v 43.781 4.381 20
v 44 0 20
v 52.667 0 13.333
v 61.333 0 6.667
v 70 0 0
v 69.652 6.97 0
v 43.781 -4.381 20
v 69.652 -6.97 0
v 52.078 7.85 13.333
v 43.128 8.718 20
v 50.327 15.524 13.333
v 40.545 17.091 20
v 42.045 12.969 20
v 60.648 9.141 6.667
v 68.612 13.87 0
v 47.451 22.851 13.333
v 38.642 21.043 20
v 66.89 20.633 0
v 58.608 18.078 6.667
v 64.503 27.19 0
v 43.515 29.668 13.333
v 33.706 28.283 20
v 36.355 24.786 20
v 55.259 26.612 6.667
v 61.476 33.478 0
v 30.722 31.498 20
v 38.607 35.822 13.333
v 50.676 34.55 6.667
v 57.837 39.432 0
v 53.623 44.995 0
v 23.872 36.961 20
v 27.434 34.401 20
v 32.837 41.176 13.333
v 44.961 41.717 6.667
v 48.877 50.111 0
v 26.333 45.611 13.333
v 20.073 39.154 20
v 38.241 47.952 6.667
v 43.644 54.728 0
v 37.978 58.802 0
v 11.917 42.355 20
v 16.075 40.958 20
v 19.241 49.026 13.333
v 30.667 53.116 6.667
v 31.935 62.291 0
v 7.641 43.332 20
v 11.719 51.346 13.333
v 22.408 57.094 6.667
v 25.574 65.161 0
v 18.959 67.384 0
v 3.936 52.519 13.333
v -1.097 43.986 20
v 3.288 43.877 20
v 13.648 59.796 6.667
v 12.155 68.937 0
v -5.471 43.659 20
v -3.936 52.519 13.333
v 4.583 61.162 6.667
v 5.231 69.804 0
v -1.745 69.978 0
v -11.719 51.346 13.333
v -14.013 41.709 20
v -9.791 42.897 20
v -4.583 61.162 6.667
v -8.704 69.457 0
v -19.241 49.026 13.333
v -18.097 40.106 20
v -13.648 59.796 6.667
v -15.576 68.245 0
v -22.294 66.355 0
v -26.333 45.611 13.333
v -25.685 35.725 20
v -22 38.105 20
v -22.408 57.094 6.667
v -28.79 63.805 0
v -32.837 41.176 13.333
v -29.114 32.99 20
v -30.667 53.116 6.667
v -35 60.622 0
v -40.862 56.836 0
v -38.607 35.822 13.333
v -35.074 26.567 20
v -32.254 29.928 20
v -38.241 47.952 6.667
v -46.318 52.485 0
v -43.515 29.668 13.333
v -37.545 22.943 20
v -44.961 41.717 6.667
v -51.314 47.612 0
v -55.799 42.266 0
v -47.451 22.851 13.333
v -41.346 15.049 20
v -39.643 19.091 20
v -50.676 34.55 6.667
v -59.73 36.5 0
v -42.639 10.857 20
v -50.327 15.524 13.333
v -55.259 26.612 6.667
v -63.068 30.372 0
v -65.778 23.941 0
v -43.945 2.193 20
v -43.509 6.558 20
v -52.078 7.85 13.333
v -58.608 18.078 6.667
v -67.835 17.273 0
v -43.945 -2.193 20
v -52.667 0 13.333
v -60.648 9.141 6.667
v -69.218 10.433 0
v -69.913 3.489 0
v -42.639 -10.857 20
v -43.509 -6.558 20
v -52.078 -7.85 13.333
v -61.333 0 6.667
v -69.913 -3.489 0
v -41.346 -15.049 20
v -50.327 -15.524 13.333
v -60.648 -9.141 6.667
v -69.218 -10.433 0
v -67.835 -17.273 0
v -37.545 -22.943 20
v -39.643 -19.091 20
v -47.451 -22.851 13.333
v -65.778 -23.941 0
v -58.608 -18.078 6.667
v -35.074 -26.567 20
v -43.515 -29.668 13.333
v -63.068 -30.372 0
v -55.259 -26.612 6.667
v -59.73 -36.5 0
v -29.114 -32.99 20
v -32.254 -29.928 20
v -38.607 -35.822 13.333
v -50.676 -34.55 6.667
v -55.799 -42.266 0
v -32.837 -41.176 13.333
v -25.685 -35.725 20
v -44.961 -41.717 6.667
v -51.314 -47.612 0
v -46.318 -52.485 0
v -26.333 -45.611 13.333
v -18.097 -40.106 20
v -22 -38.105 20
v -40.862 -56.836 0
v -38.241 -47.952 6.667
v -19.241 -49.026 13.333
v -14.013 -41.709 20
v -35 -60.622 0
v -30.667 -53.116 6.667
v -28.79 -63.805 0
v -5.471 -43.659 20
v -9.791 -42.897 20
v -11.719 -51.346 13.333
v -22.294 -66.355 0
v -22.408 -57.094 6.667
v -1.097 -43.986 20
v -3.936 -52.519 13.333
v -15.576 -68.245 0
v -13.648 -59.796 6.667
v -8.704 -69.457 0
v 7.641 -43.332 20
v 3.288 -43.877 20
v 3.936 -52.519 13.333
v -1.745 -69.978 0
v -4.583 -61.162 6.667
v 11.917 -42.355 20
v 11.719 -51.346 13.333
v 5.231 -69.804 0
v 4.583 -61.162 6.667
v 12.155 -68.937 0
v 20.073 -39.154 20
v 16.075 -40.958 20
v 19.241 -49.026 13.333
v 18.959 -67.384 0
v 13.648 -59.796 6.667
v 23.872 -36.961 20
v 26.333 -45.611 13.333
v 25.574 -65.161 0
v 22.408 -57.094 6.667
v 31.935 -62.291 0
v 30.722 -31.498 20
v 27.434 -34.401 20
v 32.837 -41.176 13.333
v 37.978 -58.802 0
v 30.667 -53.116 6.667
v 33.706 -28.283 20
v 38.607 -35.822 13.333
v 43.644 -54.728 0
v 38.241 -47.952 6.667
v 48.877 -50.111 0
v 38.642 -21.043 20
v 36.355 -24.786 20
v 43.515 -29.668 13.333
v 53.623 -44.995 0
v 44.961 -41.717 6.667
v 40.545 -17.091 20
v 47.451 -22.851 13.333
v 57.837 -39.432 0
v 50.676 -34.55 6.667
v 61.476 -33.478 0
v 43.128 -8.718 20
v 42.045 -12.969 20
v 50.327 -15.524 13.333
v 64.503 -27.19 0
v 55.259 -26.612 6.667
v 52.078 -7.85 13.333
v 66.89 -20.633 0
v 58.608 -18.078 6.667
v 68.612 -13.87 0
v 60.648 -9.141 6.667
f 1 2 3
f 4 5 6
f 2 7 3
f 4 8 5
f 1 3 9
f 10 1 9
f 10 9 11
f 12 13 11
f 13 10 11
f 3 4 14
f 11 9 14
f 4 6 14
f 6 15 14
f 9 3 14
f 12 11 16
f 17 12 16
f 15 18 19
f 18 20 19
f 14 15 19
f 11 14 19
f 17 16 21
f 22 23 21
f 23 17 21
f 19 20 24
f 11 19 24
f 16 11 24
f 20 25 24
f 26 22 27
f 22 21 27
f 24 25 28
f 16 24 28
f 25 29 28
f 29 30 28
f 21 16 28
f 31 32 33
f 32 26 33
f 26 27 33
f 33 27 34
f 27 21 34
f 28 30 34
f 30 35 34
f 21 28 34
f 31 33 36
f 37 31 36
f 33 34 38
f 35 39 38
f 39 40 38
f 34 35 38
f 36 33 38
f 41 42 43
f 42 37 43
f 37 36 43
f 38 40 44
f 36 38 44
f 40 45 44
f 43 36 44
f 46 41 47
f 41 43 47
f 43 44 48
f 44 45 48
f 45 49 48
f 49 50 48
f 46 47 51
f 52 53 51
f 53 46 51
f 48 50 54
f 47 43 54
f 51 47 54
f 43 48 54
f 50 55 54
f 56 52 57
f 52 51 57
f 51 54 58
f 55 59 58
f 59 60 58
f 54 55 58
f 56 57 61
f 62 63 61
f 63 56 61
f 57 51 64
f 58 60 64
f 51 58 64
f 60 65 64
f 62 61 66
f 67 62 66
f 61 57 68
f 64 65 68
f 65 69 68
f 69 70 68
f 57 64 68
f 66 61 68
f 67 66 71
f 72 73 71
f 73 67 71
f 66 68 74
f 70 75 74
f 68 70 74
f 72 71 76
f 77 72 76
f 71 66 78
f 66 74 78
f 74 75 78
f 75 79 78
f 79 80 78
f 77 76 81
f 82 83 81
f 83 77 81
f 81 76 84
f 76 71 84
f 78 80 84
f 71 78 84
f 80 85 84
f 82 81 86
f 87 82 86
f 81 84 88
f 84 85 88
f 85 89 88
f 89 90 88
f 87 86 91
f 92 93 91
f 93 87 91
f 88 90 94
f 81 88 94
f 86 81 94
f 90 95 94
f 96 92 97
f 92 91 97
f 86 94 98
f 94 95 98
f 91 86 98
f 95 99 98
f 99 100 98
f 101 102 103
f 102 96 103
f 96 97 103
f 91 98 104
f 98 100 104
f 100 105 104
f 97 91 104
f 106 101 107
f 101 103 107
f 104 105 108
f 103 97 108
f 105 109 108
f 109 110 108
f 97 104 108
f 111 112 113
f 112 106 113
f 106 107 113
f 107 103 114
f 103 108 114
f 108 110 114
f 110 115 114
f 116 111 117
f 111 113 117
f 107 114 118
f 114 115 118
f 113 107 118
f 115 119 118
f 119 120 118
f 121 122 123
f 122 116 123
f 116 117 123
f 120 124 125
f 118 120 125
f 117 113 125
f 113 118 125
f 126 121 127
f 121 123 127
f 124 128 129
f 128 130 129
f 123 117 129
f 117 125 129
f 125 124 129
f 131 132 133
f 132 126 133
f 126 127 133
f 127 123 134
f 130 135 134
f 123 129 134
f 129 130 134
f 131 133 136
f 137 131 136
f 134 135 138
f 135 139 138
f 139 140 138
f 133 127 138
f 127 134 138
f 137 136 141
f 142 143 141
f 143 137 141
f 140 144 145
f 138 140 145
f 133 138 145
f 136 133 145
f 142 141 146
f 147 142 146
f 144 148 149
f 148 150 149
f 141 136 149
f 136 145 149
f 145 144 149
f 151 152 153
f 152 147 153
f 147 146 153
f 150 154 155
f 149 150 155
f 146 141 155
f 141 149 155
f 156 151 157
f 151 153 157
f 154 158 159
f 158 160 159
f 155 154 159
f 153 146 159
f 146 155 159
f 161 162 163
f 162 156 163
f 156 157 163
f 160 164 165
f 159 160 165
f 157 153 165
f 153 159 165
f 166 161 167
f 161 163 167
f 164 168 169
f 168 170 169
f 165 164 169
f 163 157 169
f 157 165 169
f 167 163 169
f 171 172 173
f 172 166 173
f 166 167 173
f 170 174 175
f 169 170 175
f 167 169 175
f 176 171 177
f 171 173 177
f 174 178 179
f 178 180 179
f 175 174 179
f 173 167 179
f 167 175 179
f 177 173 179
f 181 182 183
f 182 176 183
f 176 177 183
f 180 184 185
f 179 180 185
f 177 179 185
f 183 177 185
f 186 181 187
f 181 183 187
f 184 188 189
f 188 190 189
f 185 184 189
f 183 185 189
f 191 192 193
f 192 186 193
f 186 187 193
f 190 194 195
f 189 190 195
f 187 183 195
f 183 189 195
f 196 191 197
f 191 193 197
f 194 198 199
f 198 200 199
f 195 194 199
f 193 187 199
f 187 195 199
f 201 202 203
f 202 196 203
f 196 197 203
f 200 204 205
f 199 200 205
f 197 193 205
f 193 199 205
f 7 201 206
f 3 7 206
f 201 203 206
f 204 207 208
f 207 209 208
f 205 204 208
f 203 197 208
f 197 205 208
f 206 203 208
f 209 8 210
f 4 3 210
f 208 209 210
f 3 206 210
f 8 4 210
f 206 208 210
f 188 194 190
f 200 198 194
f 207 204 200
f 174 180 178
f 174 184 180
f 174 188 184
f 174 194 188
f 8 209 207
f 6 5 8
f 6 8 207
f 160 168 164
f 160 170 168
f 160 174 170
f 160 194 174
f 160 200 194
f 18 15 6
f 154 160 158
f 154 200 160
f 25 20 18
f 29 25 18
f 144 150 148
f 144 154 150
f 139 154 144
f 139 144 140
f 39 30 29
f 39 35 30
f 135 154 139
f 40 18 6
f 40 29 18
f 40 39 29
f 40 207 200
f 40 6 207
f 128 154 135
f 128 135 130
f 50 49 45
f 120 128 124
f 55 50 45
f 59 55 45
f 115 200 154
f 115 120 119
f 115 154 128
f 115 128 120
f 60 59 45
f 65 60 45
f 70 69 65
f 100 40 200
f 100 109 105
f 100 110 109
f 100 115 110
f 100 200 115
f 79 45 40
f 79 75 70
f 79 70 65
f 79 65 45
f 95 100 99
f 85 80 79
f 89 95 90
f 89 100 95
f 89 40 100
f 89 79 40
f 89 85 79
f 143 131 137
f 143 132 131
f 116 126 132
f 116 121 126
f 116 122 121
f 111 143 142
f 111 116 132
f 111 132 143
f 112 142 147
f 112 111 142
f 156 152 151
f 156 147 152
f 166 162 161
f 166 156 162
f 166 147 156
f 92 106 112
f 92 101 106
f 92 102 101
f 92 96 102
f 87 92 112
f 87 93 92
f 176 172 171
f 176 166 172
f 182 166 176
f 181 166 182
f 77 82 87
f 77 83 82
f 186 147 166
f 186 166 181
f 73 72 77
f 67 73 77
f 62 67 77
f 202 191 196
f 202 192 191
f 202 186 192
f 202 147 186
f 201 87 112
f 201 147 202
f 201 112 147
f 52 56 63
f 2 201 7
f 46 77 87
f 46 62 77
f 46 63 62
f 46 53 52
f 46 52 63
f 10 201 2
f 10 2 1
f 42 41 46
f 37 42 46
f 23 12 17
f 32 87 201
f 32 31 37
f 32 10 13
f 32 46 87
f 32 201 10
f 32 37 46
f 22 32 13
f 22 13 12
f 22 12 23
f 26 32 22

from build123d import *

# Parameters (mm, degrees)
SKETCH_1_R      = 44
EXTRUDE_1_DEPTH = 20
SKETCH_4_R      = 70


with BuildPart() as part:
    # 草图1 → 凸台-拉伸1 (new body)
    with BuildSketch(Plane.XY):
        Circle(SKETCH_1_R)
    extrude(amount=EXTRUDE_1_DEPTH)

    # 草图4 → section 1 of loft_3
    with BuildSketch(Plane(origin=(0, 0, 0), x_dir=(-1, 0, 0), z_dir=(0, 0, -1)), mode=Mode.PRIVATE) as loft_3_s1:
        Circle(SKETCH_4_R)
    # loft up to a face of the part (loft_3)
    loft([Face(Wire([part.edges().sort_by_distance((-30.120072661, 32.074619607, 20))[0]])), loft_3_s1.sketch])


solid = part.part
